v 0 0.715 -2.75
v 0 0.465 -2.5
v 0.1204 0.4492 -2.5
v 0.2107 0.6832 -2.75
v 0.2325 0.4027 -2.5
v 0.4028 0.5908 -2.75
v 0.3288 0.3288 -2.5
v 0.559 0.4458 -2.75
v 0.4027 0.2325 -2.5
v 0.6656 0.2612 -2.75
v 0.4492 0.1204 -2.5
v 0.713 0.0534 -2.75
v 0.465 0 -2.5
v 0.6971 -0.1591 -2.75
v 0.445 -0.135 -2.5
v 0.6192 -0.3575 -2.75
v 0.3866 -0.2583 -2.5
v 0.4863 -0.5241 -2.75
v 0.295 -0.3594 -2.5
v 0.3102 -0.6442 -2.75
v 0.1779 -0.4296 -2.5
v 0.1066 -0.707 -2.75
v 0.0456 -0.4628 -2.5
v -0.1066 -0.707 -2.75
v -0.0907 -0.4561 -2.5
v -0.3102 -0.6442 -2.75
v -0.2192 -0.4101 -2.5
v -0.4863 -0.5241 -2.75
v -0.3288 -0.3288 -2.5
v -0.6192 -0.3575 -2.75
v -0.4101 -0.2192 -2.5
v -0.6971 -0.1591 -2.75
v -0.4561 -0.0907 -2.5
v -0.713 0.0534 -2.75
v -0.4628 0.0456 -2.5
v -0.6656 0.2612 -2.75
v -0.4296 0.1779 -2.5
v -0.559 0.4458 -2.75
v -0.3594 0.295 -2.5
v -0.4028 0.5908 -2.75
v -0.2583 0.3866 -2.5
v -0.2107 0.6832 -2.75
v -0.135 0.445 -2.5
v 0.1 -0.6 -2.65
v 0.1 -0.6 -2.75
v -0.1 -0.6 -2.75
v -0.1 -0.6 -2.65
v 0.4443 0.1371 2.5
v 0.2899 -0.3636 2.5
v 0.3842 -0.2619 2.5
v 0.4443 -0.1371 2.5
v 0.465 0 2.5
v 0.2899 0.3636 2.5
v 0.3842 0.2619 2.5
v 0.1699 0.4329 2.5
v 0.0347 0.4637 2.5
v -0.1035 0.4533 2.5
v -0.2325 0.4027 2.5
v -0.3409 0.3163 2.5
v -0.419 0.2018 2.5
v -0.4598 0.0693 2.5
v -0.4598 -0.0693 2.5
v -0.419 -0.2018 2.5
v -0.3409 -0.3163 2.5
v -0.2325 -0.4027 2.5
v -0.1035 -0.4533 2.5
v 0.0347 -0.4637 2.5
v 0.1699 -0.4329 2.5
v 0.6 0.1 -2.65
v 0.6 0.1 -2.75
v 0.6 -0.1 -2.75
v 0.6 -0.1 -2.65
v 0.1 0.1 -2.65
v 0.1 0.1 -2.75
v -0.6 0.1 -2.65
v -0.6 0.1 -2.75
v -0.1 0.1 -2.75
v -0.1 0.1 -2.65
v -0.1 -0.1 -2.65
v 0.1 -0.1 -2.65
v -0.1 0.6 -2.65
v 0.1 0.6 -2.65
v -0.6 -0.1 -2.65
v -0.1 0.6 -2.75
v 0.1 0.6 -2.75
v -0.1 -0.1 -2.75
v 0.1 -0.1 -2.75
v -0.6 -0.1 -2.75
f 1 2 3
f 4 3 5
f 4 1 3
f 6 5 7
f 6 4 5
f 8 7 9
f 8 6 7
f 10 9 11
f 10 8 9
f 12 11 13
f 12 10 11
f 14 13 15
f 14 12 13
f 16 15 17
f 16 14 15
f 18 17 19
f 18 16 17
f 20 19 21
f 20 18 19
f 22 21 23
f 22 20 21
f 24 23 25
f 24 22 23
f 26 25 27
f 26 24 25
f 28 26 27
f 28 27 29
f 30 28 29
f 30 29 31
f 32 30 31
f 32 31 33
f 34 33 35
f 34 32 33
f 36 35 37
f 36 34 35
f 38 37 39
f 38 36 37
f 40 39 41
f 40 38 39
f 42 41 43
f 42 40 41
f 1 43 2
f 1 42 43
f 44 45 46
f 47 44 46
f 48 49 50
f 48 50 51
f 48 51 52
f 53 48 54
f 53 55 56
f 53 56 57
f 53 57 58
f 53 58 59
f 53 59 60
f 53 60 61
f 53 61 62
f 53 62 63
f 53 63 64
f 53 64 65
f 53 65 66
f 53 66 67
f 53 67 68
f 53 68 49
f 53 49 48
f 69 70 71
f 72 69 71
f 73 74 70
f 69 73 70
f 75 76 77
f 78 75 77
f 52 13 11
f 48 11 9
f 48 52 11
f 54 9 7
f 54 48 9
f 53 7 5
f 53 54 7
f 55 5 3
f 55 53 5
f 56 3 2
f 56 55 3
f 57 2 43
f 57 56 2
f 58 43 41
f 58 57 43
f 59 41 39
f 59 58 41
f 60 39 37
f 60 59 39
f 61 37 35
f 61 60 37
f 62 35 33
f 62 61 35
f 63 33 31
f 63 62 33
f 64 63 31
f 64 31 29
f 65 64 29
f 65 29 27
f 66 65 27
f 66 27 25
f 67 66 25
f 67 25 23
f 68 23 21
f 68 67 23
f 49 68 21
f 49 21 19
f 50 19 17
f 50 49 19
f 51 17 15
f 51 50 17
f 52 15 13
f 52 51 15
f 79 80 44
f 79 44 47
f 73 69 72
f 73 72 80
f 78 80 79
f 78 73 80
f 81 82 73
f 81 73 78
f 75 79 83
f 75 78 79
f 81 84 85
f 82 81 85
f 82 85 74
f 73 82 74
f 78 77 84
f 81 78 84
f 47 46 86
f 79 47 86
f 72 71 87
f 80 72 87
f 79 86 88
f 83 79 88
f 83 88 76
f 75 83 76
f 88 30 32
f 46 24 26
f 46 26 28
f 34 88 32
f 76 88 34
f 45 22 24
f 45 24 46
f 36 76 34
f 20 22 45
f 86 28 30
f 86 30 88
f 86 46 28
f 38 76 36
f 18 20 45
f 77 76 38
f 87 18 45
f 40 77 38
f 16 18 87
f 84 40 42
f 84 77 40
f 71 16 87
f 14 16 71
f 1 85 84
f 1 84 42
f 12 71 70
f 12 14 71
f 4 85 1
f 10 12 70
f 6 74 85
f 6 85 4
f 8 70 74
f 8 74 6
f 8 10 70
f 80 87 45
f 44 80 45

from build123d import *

# Parameters (mm, degrees)
SKETCH1_R           = 0.465
BOSS_EXTRUDE1_DEPTH = 2.5
CUT_EXTRUDE1_DEPTH  = 0.1


with BuildPart() as part:
    # Sketch1 → Boss-Extrude1 (new body, symmetric)
    with BuildSketch(Plane.XY):
        Circle(SKETCH1_R)
    extrude(amount=BOSS_EXTRUDE1_DEPTH, both=True)

    # Sketch2 → Revolve1 (revolve)
    with BuildSketch(Plane(origin=(0, 0, 0), x_dir=(0, 0, -1), z_dir=(1, 0, 0))):
        Polygon((2.75, 0.715), (2.75, 0), (2.5, 0), (2.5, 0.465), align=None)
    revolve(axis=Axis((0, 0, 2.0805), (0, 0, -1)))

    # Sketch3 → Cut-Extrude1 (cut)
    with BuildSketch(Plane(origin=(0, 0, -2.75), x_dir=(-1, 0, 0), z_dir=(0, 0, -1))):
        Polygon((0.1, 0.6), (-0.1, 0.6), (-0.1, 0.1), (-0.6, 0.1), (-0.6, -0.1), (-0.1, -0.1), (-0.1, -0.6), (0.1, -0.6), (0.1, -0.1), (0.6, -0.1), (0.6, 0.1), (0.1, 0.1), align=None)
    extrude(amount=-CUT_EXTRUDE1_DEPTH, mode=Mode.SUBTRACT)


solid = part.part
